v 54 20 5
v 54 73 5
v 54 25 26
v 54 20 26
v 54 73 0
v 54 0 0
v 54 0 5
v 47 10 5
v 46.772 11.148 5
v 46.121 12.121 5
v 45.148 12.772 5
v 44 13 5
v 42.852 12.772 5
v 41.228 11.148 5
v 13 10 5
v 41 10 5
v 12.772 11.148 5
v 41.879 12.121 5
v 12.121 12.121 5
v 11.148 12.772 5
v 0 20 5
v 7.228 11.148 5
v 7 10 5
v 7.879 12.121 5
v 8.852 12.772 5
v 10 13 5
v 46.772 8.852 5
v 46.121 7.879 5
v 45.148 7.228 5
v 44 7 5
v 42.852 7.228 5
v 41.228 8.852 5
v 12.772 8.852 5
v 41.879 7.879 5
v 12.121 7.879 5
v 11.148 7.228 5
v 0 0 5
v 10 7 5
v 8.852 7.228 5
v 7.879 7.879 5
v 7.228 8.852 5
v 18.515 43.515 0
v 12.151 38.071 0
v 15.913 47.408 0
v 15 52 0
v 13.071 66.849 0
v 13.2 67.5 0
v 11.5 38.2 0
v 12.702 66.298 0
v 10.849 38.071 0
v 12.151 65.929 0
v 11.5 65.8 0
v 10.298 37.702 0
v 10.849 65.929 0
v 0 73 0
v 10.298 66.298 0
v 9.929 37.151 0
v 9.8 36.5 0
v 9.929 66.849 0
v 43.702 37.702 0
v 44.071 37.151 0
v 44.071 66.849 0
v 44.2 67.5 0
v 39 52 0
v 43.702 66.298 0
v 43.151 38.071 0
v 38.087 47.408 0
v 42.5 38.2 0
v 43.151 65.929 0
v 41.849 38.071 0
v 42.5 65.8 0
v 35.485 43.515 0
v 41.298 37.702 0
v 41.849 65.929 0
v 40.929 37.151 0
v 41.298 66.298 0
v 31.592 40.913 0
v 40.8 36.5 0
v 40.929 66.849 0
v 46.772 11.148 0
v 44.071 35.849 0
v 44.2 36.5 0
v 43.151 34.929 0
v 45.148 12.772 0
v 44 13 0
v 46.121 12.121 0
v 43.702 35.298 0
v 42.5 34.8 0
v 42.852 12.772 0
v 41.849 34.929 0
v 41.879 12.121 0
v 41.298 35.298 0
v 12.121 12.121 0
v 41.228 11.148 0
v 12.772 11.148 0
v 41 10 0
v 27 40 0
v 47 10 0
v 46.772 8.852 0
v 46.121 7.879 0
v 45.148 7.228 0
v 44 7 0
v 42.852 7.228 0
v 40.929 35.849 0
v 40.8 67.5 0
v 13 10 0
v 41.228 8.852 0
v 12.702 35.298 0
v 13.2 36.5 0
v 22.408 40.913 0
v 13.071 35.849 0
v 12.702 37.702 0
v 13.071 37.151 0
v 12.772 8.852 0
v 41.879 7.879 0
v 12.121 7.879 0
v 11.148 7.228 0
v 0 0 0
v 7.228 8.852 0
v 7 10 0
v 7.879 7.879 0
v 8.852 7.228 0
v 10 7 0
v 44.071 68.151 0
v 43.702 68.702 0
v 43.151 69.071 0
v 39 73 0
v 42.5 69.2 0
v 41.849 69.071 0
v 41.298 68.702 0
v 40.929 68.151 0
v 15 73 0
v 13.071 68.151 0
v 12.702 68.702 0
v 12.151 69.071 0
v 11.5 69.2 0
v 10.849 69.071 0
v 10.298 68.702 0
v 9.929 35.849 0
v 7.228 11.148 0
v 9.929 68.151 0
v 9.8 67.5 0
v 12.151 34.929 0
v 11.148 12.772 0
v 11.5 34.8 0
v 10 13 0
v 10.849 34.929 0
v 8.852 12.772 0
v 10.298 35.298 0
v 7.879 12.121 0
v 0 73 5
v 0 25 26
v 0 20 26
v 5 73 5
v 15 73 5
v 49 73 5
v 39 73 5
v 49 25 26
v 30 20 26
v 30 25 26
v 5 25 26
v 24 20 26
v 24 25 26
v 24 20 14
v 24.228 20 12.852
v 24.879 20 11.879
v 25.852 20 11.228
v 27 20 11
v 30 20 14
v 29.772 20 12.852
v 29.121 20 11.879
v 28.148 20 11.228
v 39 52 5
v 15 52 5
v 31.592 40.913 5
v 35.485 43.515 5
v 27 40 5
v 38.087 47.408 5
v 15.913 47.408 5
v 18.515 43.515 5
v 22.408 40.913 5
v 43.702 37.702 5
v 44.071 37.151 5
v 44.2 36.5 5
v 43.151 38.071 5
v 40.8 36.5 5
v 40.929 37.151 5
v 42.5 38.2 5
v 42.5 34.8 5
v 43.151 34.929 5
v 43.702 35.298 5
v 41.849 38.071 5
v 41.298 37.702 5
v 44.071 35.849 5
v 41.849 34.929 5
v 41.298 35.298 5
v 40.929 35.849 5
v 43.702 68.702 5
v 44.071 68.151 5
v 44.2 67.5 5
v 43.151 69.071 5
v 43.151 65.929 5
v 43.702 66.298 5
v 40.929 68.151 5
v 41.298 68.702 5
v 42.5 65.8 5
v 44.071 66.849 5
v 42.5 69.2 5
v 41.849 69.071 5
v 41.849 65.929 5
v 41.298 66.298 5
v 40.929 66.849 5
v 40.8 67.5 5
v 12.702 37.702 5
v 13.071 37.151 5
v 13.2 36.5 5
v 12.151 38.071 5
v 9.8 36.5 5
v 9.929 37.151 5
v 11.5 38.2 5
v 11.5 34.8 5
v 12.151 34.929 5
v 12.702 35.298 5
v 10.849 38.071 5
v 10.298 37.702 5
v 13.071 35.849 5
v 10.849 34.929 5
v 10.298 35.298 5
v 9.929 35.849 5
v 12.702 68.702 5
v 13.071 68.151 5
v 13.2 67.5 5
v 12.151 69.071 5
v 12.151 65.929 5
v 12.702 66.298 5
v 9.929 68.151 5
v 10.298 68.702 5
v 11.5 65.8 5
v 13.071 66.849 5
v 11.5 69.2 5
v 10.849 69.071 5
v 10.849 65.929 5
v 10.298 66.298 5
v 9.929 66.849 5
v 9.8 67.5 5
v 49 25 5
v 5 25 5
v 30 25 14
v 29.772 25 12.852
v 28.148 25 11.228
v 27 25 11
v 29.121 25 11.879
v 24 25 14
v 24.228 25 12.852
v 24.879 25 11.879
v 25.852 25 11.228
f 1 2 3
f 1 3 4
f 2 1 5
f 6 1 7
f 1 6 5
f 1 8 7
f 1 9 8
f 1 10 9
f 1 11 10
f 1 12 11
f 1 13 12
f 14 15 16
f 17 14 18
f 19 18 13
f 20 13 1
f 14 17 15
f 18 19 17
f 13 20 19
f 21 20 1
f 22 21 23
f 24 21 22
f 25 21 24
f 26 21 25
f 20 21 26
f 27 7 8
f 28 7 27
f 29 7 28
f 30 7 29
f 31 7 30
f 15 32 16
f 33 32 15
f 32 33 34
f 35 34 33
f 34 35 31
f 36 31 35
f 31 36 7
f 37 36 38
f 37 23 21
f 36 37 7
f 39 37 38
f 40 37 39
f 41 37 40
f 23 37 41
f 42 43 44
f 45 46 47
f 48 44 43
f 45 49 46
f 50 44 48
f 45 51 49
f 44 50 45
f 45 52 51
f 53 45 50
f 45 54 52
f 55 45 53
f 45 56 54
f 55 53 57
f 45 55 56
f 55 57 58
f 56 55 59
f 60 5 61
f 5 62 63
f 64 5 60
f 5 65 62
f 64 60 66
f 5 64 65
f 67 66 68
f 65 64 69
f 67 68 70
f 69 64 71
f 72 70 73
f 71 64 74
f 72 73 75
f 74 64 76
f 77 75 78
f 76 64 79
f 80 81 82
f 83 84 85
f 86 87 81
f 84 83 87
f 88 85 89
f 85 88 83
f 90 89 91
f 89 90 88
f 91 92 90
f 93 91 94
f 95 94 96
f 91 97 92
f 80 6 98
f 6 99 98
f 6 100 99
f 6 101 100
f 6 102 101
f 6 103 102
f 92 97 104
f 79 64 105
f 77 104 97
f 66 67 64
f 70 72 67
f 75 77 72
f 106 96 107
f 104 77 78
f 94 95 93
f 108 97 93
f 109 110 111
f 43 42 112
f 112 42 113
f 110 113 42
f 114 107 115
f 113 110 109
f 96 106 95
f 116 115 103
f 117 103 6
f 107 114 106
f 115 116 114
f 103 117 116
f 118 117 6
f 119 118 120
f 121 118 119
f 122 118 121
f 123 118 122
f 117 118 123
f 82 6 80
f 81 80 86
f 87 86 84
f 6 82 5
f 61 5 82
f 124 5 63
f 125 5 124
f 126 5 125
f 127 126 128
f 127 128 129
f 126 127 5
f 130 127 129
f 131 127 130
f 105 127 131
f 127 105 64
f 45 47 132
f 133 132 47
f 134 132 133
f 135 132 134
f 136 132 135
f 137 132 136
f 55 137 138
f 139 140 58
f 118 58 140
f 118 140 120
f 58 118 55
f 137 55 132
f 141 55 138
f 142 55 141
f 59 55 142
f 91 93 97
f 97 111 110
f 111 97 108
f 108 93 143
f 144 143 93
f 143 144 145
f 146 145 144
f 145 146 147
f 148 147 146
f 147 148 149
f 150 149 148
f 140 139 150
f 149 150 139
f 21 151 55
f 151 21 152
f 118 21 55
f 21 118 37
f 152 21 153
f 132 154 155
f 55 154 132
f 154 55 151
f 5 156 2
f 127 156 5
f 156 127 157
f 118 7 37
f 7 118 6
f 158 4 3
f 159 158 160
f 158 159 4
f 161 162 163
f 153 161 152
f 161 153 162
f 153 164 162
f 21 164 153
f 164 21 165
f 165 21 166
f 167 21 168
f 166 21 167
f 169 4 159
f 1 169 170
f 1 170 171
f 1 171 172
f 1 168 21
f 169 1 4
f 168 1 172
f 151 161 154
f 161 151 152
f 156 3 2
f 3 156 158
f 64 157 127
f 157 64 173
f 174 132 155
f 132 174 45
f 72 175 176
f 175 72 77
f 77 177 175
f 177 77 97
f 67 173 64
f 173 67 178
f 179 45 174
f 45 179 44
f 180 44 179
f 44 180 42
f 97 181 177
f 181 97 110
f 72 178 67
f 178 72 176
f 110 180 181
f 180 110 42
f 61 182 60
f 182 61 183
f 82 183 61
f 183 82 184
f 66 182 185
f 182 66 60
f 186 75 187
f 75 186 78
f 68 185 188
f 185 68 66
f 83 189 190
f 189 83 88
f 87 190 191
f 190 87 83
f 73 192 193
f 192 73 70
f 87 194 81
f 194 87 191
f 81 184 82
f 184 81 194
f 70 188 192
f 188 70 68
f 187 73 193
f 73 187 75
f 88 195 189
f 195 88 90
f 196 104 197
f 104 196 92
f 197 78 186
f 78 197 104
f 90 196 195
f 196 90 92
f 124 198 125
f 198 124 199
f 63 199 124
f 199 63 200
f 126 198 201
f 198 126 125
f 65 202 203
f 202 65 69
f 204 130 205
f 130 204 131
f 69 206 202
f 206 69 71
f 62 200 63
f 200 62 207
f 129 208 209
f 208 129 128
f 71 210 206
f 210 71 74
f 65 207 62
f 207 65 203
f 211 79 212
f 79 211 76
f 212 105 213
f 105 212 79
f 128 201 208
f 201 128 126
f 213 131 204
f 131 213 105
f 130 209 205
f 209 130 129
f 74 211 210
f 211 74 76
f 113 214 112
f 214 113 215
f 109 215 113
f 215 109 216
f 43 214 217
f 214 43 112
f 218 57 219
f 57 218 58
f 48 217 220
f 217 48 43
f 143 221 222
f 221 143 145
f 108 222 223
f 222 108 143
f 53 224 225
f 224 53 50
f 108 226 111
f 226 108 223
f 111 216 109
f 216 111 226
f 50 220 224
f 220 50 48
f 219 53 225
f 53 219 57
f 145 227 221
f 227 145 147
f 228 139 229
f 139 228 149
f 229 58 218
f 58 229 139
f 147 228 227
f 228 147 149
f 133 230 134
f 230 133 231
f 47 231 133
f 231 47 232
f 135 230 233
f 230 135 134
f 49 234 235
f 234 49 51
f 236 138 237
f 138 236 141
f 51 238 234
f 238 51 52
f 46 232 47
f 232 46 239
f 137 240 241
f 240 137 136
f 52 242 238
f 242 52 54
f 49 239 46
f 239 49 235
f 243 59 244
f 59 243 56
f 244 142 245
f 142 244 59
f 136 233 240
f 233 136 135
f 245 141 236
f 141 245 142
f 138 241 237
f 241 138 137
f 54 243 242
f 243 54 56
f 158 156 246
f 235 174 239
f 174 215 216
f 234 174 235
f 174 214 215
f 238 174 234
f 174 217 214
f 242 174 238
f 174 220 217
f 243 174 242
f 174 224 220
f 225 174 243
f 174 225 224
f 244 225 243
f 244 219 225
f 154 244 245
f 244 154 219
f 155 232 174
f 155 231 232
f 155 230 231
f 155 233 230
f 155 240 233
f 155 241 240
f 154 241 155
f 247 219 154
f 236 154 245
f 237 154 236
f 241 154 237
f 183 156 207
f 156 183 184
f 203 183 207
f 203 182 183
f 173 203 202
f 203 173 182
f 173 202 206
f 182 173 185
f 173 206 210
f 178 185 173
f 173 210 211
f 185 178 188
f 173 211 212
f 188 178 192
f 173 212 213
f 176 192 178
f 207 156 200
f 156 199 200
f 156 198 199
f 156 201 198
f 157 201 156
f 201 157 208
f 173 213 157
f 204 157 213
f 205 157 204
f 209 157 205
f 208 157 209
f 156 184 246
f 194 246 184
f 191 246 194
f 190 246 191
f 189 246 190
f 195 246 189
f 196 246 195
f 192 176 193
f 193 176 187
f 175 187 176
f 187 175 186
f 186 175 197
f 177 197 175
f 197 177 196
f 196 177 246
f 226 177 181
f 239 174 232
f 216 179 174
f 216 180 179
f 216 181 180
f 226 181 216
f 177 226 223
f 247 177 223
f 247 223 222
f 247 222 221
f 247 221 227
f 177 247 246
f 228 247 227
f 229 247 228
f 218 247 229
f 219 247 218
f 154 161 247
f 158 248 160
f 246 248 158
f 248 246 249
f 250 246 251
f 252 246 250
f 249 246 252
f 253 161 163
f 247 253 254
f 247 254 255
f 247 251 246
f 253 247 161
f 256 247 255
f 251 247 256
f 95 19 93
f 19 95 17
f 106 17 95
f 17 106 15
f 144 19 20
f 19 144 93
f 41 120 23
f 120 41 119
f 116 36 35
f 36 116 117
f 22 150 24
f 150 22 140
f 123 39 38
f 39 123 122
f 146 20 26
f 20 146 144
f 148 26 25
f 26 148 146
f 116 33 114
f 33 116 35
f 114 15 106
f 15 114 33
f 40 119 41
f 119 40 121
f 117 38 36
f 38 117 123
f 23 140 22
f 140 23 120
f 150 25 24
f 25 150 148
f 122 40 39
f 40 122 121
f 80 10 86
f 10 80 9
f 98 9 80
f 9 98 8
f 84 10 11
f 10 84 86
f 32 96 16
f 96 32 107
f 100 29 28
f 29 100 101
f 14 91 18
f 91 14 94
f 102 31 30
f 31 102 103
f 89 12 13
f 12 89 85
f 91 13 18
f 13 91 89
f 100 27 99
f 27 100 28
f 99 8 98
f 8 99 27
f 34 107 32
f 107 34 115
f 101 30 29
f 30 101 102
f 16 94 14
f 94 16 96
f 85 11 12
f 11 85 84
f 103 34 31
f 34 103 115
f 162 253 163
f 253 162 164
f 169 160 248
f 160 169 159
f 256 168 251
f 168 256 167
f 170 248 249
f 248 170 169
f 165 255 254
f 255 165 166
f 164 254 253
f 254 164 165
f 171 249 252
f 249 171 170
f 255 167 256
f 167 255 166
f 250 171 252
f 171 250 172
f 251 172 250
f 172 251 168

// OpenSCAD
$fn=16;

module ymotor() {
    difference() {
        union() {
            cube([44+10,20+5+5+43,5]);
            translate([0,20,0]) hull() {
                cube([44+10,5+5+43,5]);
                cube([44+10,5,26]);
            }
        }
        
        // motor place
        translate([5,25,5]) cube([44,44+5,44]);
        
        // nema17 mount
        translate([5+22,20+5+5+22,-1]) {
            hull() {
                cylinder(d=24,h=10);
                translate([0,30,0]) cylinder(d=24,h=10);
            }
            translate([15.5,-15.5,0]) cylinder(d=3.4,h=10);
            translate([15.5,15.5,0]) cylinder(d=3.4,h=10);
            translate([-15.5,-15.5,0]) cylinder(d=3.4,h=10);
            translate([-15.5,15.5,0]) cylinder(d=3.4,h=10);
        }
        
        // 2020 mounts
        translate([10,10,-1]) cylinder(d=6,h=10);
        translate([54-10,10,-1]) cylinder(d=6,h=10);
        translate([54/2,19,14]) rotate([-90,0,0]) hull() {
            cylinder(d=6,h=10);
            translate([0,-15,0]) cylinder(d=6,h=10);
        }
    }
}

ymotor();
